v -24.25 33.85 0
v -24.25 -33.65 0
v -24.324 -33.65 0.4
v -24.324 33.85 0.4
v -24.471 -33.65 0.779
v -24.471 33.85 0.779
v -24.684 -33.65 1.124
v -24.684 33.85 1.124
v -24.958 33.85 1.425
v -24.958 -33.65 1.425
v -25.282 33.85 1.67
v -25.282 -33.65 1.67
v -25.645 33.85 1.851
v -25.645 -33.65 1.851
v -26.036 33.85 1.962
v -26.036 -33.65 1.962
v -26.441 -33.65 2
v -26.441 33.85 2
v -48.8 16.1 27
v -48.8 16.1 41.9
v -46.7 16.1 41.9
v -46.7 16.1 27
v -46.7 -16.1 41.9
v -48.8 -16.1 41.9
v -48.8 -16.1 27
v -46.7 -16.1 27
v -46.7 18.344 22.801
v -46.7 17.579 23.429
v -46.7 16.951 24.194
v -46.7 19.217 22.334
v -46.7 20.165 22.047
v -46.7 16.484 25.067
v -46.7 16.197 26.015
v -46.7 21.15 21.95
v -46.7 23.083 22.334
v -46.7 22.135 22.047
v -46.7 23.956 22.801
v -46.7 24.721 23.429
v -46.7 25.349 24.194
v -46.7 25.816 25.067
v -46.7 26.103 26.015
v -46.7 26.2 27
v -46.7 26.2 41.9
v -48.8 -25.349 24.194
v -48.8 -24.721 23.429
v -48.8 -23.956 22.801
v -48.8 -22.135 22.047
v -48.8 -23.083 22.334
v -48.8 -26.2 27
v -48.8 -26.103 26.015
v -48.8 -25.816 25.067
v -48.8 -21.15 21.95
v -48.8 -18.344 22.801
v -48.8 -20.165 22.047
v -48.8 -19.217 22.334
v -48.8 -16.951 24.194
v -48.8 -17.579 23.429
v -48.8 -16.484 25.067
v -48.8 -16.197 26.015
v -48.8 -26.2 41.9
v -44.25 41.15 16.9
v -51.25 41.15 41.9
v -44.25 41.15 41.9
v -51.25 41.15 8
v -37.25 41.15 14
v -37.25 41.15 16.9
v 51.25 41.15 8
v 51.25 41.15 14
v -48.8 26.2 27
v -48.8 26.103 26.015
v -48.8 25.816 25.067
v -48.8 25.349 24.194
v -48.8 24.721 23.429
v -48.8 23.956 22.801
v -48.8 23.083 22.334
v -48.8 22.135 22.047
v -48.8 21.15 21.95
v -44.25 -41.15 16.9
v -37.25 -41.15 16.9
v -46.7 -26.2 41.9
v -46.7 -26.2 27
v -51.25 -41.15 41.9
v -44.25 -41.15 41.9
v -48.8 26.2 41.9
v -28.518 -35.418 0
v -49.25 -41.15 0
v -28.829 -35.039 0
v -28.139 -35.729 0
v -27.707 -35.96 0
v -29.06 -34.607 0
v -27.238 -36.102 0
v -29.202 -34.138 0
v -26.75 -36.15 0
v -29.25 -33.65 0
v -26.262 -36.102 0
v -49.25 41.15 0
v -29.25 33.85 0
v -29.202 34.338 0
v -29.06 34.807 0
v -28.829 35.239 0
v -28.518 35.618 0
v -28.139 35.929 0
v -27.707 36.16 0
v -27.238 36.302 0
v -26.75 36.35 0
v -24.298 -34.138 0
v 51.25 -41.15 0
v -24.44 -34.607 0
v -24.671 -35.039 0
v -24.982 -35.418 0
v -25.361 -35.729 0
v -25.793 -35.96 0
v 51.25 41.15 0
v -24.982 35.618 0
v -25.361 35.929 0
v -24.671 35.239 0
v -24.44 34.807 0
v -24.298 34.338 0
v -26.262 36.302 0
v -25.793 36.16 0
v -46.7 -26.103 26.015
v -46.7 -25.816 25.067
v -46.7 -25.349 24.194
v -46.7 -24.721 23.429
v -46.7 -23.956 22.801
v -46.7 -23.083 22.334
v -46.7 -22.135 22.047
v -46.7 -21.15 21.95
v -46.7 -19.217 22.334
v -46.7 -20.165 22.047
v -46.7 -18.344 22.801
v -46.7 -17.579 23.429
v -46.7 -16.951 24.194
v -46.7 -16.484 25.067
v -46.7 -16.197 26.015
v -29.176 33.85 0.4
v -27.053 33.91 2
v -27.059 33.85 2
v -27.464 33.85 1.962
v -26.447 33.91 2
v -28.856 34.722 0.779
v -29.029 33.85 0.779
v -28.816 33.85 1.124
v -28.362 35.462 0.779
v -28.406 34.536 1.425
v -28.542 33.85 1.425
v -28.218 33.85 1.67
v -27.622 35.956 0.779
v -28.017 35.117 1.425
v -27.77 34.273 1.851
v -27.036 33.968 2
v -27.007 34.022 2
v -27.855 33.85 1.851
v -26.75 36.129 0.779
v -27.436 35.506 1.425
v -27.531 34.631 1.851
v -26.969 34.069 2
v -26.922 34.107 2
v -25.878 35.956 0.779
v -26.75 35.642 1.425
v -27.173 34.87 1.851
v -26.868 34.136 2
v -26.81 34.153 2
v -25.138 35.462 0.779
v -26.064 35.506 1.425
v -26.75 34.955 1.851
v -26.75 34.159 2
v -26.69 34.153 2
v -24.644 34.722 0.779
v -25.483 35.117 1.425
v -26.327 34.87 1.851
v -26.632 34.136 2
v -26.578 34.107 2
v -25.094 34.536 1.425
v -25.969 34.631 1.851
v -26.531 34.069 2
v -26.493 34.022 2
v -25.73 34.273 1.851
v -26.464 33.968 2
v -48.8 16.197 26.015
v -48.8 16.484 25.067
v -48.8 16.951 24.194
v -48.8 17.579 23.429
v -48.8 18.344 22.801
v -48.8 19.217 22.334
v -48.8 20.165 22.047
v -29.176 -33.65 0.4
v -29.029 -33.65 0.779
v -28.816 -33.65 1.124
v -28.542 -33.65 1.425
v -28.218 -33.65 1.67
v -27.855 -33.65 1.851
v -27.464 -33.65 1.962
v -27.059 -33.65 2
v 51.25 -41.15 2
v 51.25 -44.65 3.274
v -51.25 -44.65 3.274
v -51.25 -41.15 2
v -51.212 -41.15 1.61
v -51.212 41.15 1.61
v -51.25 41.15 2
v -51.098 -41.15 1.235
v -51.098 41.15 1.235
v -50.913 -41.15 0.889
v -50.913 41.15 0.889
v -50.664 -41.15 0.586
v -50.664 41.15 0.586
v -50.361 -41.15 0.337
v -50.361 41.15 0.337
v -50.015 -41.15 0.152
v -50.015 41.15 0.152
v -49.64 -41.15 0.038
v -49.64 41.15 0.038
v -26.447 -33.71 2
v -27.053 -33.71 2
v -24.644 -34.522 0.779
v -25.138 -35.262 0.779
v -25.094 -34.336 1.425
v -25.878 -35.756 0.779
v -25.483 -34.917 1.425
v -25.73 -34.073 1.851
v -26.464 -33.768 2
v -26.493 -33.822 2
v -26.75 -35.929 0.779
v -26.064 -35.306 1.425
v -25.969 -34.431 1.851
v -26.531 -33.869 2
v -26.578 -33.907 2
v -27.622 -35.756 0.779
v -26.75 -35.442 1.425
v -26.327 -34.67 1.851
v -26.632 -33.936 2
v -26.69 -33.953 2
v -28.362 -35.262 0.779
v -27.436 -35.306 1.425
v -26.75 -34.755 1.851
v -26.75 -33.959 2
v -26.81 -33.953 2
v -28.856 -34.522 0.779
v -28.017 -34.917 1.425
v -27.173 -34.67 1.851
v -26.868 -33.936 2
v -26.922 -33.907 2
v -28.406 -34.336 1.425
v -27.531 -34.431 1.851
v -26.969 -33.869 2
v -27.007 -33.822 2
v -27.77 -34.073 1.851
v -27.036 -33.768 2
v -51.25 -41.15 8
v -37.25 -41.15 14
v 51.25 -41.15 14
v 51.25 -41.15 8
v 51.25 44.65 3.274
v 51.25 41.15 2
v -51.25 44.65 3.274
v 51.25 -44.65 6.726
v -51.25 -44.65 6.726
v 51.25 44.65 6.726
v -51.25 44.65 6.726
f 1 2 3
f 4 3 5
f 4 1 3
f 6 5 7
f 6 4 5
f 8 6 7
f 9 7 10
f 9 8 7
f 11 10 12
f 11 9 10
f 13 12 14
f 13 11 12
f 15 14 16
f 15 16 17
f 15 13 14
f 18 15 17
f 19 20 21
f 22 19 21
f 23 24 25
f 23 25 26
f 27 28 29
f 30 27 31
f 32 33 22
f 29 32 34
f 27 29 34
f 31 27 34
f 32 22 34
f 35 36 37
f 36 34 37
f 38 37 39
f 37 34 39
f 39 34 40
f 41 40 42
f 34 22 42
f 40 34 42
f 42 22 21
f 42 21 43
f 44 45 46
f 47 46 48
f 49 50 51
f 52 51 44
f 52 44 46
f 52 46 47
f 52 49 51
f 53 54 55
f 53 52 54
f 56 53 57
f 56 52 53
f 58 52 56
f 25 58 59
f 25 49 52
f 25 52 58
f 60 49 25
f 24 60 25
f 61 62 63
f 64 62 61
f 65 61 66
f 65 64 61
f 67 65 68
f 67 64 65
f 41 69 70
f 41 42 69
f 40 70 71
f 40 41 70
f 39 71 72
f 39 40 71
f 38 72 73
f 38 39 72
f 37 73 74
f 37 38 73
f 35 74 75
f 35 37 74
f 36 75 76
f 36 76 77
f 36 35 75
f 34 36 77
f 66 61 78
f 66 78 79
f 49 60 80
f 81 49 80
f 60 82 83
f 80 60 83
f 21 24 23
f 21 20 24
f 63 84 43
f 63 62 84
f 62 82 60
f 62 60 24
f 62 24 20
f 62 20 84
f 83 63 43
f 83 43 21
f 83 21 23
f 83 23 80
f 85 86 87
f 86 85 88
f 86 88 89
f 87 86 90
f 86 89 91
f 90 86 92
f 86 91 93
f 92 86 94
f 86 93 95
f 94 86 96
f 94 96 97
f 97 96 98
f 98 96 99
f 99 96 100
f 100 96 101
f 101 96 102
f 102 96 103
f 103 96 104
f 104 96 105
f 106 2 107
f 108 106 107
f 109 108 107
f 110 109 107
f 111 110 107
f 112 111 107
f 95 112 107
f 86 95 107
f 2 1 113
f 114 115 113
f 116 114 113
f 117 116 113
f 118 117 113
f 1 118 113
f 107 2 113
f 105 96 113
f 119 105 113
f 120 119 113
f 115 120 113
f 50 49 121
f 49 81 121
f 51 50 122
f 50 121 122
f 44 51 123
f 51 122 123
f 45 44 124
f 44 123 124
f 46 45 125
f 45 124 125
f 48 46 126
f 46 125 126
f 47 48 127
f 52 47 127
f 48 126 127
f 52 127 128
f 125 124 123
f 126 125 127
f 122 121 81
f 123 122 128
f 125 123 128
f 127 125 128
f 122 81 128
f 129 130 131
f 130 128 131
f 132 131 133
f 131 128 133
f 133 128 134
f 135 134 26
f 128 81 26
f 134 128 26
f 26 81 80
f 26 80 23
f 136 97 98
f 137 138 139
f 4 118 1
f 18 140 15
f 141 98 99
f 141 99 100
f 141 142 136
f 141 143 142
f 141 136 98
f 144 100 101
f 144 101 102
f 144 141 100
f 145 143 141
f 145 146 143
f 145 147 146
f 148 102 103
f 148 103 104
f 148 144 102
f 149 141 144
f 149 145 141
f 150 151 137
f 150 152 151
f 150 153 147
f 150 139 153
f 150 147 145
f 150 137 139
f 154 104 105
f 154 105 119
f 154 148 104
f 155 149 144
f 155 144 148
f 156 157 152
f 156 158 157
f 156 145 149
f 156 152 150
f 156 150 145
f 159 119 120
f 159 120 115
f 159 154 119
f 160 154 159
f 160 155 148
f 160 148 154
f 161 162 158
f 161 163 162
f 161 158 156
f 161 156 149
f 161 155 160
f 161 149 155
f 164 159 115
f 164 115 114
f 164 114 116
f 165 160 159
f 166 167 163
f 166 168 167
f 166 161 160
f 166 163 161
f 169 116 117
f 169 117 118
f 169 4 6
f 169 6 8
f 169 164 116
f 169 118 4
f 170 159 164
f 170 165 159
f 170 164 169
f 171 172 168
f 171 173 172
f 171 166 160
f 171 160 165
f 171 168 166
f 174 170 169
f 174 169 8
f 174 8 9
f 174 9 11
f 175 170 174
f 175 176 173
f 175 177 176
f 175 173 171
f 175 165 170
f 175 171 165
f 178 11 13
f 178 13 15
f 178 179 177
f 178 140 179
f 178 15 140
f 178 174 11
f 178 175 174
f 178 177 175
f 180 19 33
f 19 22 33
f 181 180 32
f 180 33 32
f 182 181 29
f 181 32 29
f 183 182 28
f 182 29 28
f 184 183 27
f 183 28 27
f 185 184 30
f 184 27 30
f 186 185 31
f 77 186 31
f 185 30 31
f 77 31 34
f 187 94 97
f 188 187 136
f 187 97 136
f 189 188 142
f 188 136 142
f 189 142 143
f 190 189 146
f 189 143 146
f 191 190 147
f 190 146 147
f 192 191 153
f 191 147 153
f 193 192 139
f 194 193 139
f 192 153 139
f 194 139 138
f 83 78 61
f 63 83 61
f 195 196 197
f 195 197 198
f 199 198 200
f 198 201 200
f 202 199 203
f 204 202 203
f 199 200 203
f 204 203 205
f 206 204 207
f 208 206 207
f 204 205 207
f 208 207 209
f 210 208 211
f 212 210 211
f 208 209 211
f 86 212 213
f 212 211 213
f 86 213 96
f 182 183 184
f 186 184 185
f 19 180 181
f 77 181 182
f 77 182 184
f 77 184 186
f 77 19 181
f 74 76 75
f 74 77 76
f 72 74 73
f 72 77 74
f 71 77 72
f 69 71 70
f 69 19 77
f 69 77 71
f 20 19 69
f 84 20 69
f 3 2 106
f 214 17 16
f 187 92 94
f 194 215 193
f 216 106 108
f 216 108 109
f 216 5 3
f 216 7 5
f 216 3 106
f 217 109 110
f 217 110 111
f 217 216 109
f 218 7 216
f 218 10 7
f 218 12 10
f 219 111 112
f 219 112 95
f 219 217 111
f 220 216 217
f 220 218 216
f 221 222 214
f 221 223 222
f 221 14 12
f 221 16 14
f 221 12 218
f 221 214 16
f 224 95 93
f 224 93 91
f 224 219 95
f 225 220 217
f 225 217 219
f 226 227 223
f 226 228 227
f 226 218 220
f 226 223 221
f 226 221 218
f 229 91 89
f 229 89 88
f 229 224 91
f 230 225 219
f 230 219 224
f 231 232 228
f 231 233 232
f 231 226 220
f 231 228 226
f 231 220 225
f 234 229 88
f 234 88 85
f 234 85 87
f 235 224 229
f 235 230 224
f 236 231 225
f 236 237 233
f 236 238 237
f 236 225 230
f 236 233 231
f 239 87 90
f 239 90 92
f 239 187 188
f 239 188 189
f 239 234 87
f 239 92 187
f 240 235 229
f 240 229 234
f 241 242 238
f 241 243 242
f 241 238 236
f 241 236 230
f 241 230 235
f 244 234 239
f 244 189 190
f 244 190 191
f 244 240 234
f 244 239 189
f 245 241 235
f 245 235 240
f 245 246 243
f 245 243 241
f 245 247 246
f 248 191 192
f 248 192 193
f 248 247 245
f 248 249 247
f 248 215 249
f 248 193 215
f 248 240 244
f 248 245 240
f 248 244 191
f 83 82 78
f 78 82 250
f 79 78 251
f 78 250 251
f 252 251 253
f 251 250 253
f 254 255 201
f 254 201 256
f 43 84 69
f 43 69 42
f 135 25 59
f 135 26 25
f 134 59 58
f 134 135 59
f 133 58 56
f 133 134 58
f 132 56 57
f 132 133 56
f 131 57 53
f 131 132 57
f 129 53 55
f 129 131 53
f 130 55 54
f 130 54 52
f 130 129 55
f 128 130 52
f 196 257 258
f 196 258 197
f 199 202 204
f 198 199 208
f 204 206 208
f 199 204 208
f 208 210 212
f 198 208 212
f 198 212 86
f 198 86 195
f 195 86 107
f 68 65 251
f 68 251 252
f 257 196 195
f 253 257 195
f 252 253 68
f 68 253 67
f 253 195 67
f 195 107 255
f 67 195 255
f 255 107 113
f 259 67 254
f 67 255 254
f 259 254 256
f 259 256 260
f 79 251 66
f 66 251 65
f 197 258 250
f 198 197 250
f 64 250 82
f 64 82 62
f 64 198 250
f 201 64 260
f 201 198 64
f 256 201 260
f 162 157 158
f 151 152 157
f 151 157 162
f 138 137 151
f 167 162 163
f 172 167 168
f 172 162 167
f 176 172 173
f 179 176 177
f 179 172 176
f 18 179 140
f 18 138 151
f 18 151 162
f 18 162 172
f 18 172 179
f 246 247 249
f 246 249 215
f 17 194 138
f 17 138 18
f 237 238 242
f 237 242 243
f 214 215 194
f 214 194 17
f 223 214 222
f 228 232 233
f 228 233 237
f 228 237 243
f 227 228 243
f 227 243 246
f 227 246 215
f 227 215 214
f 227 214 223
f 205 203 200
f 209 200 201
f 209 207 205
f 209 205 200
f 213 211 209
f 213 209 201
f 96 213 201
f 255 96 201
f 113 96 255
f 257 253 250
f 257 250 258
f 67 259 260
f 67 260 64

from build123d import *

# Parameters (mm, degrees)
F0_W         = 102.5
F0_H         = 82.3
F1_DEPTH     = 14
F2_W         = 7
F2_H         = 82.3
F3_DEPTH     = 27.9
F4_W         = 7
F4_H         = 82.3
F5_DEPTH     = 2.9
F7_DEPTH     = 102.5
F8_R         = 2
F11_DEPTH    = 2
F12_T1_DEPTH = 67.5
F12_T4_ANGLE = 180
F12_T6_ANGLE = 180
F13_W        = 2.1
F13_H        = 10.1
F14_DEPTH    = 19.95
F15_R        = 5.04999
F16_R        = 5.04999


# Not quite as in the source:
# - a fillet or chamfer that OpenCascade refuses, or shapes differently, is made with other operations: its cross-section is extruded or revolved along the edge and cut away or added
# - a fillet or chamfer is up to 0.001 mm smaller than in the source, because OpenCascade refuses the exact size


with BuildPart() as f1:
    # F0 (on Top) → F1 (new body)
    with BuildSketch(Plane.XY):
        Rectangle(F0_W, F0_H)
    extrude(amount=F1_DEPTH)

    # F2 (on face) → F3 (join)
    with BuildSketch(Plane.XY.offset(14)):
        with Locations((-47.75, 0)):
            Rectangle(F2_W, F2_H)
    extrude(amount=F3_DEPTH)

    # F4 (on face) → F5 (join)
    with BuildSketch(Plane.XY.offset(14)):
        with Locations((-40.75, 0)):
            Rectangle(F4_W, F4_H)
    extrude(amount=F5_DEPTH)

    # F6 (on face) → F7 (join)
    with BuildSketch(Plane.YZ.offset(51.25)):
        Polygon((41.15, 8), (41.15, 2), (44.65, 3.2738958199), (44.65, 6.7261041801), align=None)
        Polygon((-44.65, 3.2738958199), (-41.15, 2), (-41.15, 8), (-44.65, 6.7261041801), align=None)
    extrude(amount=-F7_DEPTH)

    # F8
    f8_edges = [f1.edges().sort_by_distance(p)[0] for p in [
        (-51.25, 0, 0),
    ]]
    fillet(f8_edges, radius=F8_R)

    # F10: union 

    # F9 (on face) → F11 (cut)
    with BuildSketch(Plane(origin=(0, 0, 0), x_dir=(1, 0, 0), z_dir=(0, 0, -1))):
        with BuildLine():
            ThreePointArc((-24.25, 33.65), (-26.75, 36.15), (-29.25, 33.65))
            Line((-29.25, 33.65), (-29.25, -33.85))
            ThreePointArc((-29.25, -33.85), (-26.75, -36.35), (-24.25, -33.85))
            Line((-24.25, -33.85), (-24.25, 33.65))
        make_face()
    extrude(amount=-F11_DEPTH, mode=Mode.SUBTRACT)

    # F12: fillet of radius 2.2 on 2 edges, made by hand

    # F12_s2 → F12_t1 (join)
    with BuildSketch(Plane.XZ.offset(-33.85)):
        with BuildLine():
            ThreePointArc((-29.25, 0), (-28.5423494674, 1.4248076809), (-27.05910977, 2))
            Line((-27.05910977, 2), (-29.25, 2))
            Line((-29.25, 2), (-29.25, 0))
        make_face()
        with BuildLine():
            ThreePointArc((-24.25, 0), (-24.9576505326, 1.4248076809), (-26.44089023, 2))
            Line((-26.44089023, 2), (-24.25, 2))
            Line((-24.25, 2), (-24.25, 0))
        make_face()
    extrude(amount=F12_T1_DEPTH)

    # F12_s3 → F12_t4 (revolve)
    with BuildSketch(Plane.XZ.offset(-33.85)):
        with BuildLine():
            ThreePointArc((-29.25, 0), (-28.5423494674, 1.4248076809), (-27.05910977, 2))
            Line((-27.05910977, 2), (-29.25, 2))
            Line((-29.25, 2), (-29.25, 0))
        make_face()
    revolve(axis=Axis((-26.75, 33.85, 2), (0, 0, -1)), revolution_arc=F12_T4_ANGLE)

    # F12_s5 → F12_t6 (revolve)
    with BuildSketch(Plane.XZ.offset(33.65)):
        with BuildLine():
            ThreePointArc((-24.25, 0), (-24.9576505326, 1.4248076809), (-26.44089023, 2))
            Line((-26.44089023, 2), (-24.25, 2))
            Line((-24.25, 2), (-24.25, 0))
        make_face()
    revolve(axis=Axis((-26.75, -33.65, 2), (0, 0, -1)), revolution_arc=F12_T6_ANGLE)

    # F13 (on face) → F14 (cut)
    with BuildSketch(Plane.XY.offset(41.9)):
        with Locations((-47.75, 21.15)):
            Rectangle(F13_W, F13_H)
        with Locations((-47.75, -21.15)):
            Rectangle(F13_W, F13_H)
    extrude(amount=-F14_DEPTH, mode=Mode.SUBTRACT)

    # F15 (radius 5.05 in the source; OpenCascade refuses exactly that, so slightly less here)
    f15_edges = [f1.edges().sort_by_distance(p)[0] for p in [
        (-47.75, 16.1, 21.95),
        (-47.75, 26.2, 21.95),
    ]]
    fillet(f15_edges, radius=F15_R)

    # F16 (radius 5.05 in the source; OpenCascade refuses exactly that, so slightly less here)
    f16_edges = [f1.edges().sort_by_distance(p)[0] for p in [
        (-47.75, -16.1, 21.95),
        (-47.75, -26.2, 21.95),
    ]]
    fillet(f16_edges, radius=F16_R)


solid = f1.part
